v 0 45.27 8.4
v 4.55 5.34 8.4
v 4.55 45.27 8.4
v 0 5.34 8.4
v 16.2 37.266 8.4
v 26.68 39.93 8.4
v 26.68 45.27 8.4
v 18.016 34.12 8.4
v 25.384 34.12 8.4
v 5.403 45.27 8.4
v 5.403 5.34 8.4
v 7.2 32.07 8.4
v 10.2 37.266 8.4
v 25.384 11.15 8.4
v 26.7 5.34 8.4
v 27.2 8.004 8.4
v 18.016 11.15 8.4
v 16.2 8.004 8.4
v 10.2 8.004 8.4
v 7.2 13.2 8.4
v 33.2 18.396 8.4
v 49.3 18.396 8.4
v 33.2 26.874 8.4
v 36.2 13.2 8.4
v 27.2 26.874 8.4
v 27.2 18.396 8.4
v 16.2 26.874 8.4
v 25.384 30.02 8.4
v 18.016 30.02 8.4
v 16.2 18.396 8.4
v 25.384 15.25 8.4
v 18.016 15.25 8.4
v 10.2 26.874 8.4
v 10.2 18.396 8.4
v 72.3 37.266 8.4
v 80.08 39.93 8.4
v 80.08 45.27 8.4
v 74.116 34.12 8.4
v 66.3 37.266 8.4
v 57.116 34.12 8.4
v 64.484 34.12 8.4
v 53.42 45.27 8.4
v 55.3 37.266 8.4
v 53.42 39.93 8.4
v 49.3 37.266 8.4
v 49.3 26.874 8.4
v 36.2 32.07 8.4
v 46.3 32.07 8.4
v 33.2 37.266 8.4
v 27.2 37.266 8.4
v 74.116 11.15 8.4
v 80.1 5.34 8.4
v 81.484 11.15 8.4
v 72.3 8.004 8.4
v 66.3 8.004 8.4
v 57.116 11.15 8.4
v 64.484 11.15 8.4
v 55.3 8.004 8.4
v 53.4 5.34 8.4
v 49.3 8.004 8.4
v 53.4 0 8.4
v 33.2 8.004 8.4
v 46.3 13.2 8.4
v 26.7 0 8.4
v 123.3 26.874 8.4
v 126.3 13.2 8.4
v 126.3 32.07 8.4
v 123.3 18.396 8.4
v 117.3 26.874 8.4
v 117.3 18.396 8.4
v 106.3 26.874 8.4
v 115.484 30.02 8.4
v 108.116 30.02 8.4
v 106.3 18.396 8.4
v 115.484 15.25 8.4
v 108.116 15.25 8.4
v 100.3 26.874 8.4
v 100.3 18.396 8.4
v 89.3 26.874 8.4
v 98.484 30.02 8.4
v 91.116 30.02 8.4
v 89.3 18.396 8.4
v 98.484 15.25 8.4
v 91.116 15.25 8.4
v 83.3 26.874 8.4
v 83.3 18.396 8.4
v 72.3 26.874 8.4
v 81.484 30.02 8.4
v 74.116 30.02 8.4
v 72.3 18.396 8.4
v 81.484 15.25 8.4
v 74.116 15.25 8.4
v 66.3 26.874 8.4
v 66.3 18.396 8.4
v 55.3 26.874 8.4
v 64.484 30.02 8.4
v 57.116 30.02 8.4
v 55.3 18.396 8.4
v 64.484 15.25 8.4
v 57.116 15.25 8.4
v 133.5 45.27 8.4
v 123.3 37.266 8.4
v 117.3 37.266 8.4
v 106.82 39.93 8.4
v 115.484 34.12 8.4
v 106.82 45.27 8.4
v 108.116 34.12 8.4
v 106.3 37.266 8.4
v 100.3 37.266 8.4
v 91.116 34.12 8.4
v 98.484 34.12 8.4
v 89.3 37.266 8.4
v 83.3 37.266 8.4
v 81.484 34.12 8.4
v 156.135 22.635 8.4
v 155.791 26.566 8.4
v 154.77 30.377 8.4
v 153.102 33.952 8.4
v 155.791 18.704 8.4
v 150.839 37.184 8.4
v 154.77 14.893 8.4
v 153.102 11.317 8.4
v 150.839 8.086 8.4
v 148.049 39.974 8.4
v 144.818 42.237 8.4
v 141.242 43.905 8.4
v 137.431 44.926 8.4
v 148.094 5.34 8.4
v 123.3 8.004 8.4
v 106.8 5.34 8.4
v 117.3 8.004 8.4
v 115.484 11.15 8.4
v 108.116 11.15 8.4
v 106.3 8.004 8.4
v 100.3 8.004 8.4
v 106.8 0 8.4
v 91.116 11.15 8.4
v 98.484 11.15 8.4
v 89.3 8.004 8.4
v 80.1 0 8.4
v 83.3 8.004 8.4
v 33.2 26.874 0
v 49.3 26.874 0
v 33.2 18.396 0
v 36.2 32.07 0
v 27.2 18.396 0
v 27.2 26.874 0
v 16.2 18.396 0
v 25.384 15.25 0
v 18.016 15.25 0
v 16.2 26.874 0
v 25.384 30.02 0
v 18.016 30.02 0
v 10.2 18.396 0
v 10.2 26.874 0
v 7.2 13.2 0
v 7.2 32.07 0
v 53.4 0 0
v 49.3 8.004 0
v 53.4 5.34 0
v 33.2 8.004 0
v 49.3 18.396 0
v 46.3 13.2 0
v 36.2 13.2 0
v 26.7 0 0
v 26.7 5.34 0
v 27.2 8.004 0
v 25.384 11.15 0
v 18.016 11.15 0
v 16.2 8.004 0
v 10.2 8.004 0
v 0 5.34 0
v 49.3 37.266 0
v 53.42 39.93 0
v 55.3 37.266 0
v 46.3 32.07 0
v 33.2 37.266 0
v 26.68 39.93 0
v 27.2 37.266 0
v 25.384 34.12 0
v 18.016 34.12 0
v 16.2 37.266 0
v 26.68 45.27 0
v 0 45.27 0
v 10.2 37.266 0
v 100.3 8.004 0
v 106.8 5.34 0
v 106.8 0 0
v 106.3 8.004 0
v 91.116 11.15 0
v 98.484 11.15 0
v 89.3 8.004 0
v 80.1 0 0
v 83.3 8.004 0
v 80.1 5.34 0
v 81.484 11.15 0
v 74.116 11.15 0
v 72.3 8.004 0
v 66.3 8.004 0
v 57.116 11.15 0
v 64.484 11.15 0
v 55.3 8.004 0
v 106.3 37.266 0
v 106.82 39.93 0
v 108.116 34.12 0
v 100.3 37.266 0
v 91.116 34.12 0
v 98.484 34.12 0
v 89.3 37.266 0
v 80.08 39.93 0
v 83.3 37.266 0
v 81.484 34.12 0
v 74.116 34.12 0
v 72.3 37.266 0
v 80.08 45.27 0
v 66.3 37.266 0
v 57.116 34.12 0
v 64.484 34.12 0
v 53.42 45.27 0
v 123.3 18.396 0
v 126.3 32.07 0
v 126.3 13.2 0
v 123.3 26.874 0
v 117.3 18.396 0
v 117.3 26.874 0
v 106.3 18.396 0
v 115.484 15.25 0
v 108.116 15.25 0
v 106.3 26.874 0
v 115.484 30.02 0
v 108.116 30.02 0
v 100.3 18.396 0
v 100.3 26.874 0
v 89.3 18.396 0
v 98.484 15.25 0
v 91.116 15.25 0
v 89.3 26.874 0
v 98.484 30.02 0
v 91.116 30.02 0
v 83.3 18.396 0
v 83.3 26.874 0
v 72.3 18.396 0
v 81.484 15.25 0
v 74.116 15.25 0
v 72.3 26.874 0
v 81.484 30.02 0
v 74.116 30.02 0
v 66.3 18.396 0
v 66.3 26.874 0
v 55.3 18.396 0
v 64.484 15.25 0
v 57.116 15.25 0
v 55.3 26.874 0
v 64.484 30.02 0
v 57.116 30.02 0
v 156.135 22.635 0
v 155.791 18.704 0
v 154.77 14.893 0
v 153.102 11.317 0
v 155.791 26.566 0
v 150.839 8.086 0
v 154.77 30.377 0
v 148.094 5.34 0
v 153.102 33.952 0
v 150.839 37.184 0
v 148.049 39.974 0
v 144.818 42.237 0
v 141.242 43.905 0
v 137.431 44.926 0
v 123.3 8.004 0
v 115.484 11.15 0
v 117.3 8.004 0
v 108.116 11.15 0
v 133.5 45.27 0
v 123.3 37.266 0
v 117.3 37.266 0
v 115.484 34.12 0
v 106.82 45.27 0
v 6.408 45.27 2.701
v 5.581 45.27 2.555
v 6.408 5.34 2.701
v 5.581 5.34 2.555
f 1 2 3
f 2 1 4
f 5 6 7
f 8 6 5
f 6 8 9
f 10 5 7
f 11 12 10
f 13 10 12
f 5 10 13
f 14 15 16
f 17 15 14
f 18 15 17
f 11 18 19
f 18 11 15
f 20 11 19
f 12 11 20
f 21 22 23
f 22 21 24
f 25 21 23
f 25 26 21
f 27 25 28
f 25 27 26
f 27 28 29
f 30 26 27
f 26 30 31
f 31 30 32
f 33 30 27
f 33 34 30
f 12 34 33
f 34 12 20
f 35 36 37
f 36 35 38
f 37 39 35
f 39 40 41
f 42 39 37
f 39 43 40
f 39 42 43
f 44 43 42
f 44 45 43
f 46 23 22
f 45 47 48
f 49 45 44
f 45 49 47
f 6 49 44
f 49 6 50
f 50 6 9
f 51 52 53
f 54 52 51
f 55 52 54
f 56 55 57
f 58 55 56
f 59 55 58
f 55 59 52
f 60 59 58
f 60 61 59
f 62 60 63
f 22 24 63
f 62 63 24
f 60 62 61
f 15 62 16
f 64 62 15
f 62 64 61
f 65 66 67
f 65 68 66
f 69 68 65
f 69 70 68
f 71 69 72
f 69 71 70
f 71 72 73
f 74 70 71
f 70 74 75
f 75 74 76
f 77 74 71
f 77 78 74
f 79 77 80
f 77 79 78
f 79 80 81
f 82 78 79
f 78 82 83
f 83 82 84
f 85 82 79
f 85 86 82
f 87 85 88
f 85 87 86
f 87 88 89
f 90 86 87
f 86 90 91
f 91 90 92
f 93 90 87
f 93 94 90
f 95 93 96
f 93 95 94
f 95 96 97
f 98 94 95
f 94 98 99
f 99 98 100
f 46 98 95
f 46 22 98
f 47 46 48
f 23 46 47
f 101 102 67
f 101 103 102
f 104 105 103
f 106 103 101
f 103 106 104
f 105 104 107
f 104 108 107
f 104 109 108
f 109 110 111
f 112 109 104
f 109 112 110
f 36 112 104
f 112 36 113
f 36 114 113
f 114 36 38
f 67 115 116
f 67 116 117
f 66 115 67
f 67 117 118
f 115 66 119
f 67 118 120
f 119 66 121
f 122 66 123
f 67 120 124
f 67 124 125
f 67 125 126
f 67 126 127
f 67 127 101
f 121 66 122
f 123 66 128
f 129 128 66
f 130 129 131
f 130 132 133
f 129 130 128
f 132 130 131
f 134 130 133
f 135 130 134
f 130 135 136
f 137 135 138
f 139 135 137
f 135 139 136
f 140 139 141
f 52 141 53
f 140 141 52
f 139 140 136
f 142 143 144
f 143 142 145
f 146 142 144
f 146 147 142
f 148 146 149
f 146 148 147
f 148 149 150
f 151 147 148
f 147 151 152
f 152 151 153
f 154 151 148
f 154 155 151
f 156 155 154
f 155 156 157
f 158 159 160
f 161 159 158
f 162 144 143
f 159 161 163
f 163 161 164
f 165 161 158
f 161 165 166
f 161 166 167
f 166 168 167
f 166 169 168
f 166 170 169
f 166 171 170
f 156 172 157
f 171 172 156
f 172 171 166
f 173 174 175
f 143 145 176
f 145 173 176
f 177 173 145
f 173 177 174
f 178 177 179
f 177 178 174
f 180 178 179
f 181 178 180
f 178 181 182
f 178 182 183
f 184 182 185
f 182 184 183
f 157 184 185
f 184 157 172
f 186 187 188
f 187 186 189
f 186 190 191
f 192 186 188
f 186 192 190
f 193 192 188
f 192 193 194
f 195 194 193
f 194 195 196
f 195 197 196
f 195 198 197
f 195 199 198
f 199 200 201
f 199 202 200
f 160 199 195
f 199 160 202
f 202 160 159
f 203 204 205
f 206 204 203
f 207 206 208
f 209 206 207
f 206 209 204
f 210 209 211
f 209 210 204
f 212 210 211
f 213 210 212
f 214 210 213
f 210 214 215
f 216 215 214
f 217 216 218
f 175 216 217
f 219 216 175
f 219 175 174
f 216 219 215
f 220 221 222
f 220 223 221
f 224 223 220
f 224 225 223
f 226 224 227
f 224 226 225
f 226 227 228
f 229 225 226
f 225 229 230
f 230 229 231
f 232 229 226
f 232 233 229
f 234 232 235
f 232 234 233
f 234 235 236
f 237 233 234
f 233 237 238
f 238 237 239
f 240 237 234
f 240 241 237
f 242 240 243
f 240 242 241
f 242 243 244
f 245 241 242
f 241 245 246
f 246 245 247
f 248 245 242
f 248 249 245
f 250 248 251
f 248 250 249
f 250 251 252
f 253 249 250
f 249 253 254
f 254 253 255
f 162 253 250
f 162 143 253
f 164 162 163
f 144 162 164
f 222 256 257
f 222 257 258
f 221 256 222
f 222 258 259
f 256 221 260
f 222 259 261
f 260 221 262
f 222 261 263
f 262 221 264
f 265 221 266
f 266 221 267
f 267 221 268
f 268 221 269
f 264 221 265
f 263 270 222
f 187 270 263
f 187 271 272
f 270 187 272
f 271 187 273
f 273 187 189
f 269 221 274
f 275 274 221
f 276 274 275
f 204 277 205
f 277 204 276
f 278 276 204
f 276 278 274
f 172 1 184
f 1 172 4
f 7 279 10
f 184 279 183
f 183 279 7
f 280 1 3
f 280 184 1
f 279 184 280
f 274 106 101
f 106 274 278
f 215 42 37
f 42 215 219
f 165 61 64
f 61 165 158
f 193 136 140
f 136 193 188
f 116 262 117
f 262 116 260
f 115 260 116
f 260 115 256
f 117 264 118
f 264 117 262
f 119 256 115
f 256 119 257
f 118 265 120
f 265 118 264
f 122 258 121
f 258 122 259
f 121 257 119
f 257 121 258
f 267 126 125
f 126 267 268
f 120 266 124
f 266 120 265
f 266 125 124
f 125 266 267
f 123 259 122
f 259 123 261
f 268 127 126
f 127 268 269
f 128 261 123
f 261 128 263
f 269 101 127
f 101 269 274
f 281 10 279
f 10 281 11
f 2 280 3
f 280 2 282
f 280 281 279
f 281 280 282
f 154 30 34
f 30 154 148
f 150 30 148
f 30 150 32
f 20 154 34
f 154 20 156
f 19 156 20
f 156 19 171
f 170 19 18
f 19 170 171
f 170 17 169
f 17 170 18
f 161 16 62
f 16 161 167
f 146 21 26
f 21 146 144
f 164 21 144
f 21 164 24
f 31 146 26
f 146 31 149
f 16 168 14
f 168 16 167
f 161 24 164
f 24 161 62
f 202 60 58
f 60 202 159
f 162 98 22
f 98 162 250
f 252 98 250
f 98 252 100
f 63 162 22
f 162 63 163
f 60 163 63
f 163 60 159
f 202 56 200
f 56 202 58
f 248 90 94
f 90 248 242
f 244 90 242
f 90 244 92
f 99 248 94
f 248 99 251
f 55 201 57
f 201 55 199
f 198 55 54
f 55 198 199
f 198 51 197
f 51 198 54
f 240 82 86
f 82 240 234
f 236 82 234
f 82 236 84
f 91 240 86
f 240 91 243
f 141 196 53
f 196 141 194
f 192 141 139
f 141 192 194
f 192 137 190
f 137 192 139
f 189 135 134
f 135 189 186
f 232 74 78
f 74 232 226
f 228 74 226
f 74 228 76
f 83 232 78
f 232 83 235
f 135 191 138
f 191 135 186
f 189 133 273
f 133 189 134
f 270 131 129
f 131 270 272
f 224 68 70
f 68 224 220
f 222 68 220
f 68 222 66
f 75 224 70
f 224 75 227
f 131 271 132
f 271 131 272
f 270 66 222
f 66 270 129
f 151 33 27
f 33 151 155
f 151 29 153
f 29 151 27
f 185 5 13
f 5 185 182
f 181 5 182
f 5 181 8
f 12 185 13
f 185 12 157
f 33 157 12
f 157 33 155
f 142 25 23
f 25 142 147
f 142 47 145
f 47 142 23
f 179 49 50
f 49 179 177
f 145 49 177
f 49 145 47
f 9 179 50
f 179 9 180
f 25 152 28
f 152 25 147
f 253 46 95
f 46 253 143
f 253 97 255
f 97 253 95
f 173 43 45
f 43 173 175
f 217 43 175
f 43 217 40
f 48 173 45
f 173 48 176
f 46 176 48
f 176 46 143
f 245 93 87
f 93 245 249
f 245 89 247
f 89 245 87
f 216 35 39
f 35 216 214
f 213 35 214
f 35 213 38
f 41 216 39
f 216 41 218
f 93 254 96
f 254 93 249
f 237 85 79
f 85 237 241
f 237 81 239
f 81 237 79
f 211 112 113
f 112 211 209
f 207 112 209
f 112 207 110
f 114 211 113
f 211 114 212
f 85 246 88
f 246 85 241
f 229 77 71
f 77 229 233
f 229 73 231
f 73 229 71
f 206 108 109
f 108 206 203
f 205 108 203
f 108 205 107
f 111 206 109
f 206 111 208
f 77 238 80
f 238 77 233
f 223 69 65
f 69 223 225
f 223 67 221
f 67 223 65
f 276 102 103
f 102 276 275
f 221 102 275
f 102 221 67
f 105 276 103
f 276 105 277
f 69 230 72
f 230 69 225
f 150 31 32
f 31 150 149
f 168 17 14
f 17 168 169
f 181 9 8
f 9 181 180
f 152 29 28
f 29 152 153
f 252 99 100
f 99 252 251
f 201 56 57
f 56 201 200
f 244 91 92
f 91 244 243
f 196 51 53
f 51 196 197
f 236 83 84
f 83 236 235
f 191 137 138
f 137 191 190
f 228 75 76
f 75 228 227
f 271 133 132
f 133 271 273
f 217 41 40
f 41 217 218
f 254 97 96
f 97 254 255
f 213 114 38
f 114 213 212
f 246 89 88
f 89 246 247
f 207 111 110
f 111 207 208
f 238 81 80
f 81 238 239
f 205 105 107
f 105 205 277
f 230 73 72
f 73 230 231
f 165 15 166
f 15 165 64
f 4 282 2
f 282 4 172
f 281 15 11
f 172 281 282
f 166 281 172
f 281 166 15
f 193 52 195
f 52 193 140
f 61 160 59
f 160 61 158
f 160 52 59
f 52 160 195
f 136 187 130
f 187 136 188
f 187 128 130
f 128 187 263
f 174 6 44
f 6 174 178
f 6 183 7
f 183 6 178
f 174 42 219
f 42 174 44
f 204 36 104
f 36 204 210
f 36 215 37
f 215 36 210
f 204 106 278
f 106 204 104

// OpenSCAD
$fn=6;

// unit is mm

baldia = 17; // ball diameter
holdia = 12; // hole diameter
holrad = holdia / 2;
holdis = baldia; // hole distance, center to center
holdis1 = baldia * 1.3;
trkdis = baldia * 1.11; // distance between the two tracks
cen2bor = holdia * 0.6; // center to border top

delta = holdia / 2;

len0 = cen2bor + 1 * holdis + holdis1 + 4 * holdis + cen2bor;
wid0 = cen2bor + trkdis + cen2bor;

len1 = len0 + delta * 2;
wid1 = wid0 + delta * 2;

hei = 8.4; // height
thk = 2.5; // thickness

twi = 4.1; // track width
swi = 0.84; // slit width

sla = -10; // slit angle

//hih = 2; // hill height
//hiw = 1.4; // hill thickness

tood = 0.02; // tooth delta, to allow slotting


module base() {
  cube(size=[ len1, wid1, hei ], center=false);
  translate([ len1, wid1 / 2, 0 ]) cylinder(d=wid1, h=hei, $fn=36);
}

h4 = hei / 4;
l9 = len1 / 5;

module cyl() {
  translate([ 0, 0, -h4 ]) cylinder(d=holdia, h=hei * 2);
}
module cub() {
  translate([ 0, 0, h4 ]) cube(size=[ holdis, twi, hei * 2 ], center=true);
}
module tooth() {
  translate([ 0, 0, -h4 ]) cube(l9, center=false);
}

dc = delta + cen2bor;
dch2 = dc + holdis / 2;
dch3 = dch2 + holdis + holdis1;
s1 = dc + holdis + holdis1;

difference() {

  base();
  //translate([ 0, 0, -thk ]) base();

  // slit

  translate([ cen2bor * 0.63, wid1 / 2, hei + thk ])
    rotate([ 0, sla, 0 ])
      cube(size=[ swi, wid1, hei * 2 ], center=true);

  // holes

  translate([ dc, dc, 0 ]) cyl();
  translate([ dc + holdis, dc, 0 ]) cyl();

  translate([ s1 + 0 * holdis, dc, 0 ]) cyl();
  translate([ s1 + 1 * holdis, dc, 0 ]) cyl();
  translate([ s1 + 2 * holdis, dc, 0 ]) cyl();
  translate([ s1 + 3 * holdis, dc, 0 ]) cyl();
  translate([ s1 + 4 * holdis, dc, 0 ]) cyl();

  translate([ dc, dc + trkdis, 0 ]) cyl();
  translate([ dc + holdis, dc + trkdis, 0 ]) cyl();

  translate([ s1 + 0 * holdis, dc + trkdis, 0 ]) cyl();
  translate([ s1 + 1 * holdis, dc + trkdis, 0 ]) cyl();
  translate([ s1 + 2 * holdis, dc + trkdis, 0 ]) cyl();
  translate([ s1 + 3 * holdis, dc + trkdis, 0 ]) cyl();
  translate([ s1 + 4 * holdis, dc + trkdis, 0 ]) cyl();

  // tracks

  translate([ dch2, dc, 0 ]) cub();
  translate([ dch2, dc + trkdis, 0 ]) cub();

  translate([ dch3 + 0 * holdis, dc, 0 ]) cub();
  translate([ dch3 + 1 * holdis, dc, 0 ]) cub();
  translate([ dch3 + 2 * holdis, dc, 0 ]) cub();
  translate([ dch3 + 3 * holdis, dc, 0 ]) cub();

  translate([ dch3 + 0 * holdis, dc + trkdis, 0 ]) cub();
  translate([ dch3 + 1 * holdis, dc + trkdis, 0 ]) cub();
  translate([ dch3 + 2 * holdis, dc + trkdis, 0 ]) cub();
  translate([ dch3 + 3 * holdis, dc + trkdis, 0 ]) cub();

  // hills
  //#translate([ 0, -ty0, hei ]) cube(size=[ len1, hiw, hih ]);

  // teeth

  ty0 = -l9 * 0.8;
  translate([ 0 * l9, ty0, 0 ]) tooth();
  translate([ 0 * l9 - 1, ty0, 0 ]) tooth(); // cancel ghost border
  translate([ 2 * l9, ty0, 0 ]) tooth();
  translate([ 4 * l9, ty0, 0 ]) tooth();
  translate([ 4.9 * l9, ty0, 0 ]) tooth(); // cancel ghost border

  ty1 = -l9 * 0.7 + wid1 + l9 / 2;

  translate([ 1 * l9, ty1, 0 ]) tooth();
  translate([ 1 * l9 - tood, ty1, 0 ]) tooth(); //
  translate([ 1 * l9 + tood, ty1, 0 ]) tooth(); // allow slotting...

  translate([ 3 * l9, ty1, 0 ]) tooth();
  translate([ 3 * l9 - tood, ty1, 0 ]) tooth(); //
  translate([ 3 * l9 + tood, ty1, 0 ]) tooth(); // allow slotting...
}
